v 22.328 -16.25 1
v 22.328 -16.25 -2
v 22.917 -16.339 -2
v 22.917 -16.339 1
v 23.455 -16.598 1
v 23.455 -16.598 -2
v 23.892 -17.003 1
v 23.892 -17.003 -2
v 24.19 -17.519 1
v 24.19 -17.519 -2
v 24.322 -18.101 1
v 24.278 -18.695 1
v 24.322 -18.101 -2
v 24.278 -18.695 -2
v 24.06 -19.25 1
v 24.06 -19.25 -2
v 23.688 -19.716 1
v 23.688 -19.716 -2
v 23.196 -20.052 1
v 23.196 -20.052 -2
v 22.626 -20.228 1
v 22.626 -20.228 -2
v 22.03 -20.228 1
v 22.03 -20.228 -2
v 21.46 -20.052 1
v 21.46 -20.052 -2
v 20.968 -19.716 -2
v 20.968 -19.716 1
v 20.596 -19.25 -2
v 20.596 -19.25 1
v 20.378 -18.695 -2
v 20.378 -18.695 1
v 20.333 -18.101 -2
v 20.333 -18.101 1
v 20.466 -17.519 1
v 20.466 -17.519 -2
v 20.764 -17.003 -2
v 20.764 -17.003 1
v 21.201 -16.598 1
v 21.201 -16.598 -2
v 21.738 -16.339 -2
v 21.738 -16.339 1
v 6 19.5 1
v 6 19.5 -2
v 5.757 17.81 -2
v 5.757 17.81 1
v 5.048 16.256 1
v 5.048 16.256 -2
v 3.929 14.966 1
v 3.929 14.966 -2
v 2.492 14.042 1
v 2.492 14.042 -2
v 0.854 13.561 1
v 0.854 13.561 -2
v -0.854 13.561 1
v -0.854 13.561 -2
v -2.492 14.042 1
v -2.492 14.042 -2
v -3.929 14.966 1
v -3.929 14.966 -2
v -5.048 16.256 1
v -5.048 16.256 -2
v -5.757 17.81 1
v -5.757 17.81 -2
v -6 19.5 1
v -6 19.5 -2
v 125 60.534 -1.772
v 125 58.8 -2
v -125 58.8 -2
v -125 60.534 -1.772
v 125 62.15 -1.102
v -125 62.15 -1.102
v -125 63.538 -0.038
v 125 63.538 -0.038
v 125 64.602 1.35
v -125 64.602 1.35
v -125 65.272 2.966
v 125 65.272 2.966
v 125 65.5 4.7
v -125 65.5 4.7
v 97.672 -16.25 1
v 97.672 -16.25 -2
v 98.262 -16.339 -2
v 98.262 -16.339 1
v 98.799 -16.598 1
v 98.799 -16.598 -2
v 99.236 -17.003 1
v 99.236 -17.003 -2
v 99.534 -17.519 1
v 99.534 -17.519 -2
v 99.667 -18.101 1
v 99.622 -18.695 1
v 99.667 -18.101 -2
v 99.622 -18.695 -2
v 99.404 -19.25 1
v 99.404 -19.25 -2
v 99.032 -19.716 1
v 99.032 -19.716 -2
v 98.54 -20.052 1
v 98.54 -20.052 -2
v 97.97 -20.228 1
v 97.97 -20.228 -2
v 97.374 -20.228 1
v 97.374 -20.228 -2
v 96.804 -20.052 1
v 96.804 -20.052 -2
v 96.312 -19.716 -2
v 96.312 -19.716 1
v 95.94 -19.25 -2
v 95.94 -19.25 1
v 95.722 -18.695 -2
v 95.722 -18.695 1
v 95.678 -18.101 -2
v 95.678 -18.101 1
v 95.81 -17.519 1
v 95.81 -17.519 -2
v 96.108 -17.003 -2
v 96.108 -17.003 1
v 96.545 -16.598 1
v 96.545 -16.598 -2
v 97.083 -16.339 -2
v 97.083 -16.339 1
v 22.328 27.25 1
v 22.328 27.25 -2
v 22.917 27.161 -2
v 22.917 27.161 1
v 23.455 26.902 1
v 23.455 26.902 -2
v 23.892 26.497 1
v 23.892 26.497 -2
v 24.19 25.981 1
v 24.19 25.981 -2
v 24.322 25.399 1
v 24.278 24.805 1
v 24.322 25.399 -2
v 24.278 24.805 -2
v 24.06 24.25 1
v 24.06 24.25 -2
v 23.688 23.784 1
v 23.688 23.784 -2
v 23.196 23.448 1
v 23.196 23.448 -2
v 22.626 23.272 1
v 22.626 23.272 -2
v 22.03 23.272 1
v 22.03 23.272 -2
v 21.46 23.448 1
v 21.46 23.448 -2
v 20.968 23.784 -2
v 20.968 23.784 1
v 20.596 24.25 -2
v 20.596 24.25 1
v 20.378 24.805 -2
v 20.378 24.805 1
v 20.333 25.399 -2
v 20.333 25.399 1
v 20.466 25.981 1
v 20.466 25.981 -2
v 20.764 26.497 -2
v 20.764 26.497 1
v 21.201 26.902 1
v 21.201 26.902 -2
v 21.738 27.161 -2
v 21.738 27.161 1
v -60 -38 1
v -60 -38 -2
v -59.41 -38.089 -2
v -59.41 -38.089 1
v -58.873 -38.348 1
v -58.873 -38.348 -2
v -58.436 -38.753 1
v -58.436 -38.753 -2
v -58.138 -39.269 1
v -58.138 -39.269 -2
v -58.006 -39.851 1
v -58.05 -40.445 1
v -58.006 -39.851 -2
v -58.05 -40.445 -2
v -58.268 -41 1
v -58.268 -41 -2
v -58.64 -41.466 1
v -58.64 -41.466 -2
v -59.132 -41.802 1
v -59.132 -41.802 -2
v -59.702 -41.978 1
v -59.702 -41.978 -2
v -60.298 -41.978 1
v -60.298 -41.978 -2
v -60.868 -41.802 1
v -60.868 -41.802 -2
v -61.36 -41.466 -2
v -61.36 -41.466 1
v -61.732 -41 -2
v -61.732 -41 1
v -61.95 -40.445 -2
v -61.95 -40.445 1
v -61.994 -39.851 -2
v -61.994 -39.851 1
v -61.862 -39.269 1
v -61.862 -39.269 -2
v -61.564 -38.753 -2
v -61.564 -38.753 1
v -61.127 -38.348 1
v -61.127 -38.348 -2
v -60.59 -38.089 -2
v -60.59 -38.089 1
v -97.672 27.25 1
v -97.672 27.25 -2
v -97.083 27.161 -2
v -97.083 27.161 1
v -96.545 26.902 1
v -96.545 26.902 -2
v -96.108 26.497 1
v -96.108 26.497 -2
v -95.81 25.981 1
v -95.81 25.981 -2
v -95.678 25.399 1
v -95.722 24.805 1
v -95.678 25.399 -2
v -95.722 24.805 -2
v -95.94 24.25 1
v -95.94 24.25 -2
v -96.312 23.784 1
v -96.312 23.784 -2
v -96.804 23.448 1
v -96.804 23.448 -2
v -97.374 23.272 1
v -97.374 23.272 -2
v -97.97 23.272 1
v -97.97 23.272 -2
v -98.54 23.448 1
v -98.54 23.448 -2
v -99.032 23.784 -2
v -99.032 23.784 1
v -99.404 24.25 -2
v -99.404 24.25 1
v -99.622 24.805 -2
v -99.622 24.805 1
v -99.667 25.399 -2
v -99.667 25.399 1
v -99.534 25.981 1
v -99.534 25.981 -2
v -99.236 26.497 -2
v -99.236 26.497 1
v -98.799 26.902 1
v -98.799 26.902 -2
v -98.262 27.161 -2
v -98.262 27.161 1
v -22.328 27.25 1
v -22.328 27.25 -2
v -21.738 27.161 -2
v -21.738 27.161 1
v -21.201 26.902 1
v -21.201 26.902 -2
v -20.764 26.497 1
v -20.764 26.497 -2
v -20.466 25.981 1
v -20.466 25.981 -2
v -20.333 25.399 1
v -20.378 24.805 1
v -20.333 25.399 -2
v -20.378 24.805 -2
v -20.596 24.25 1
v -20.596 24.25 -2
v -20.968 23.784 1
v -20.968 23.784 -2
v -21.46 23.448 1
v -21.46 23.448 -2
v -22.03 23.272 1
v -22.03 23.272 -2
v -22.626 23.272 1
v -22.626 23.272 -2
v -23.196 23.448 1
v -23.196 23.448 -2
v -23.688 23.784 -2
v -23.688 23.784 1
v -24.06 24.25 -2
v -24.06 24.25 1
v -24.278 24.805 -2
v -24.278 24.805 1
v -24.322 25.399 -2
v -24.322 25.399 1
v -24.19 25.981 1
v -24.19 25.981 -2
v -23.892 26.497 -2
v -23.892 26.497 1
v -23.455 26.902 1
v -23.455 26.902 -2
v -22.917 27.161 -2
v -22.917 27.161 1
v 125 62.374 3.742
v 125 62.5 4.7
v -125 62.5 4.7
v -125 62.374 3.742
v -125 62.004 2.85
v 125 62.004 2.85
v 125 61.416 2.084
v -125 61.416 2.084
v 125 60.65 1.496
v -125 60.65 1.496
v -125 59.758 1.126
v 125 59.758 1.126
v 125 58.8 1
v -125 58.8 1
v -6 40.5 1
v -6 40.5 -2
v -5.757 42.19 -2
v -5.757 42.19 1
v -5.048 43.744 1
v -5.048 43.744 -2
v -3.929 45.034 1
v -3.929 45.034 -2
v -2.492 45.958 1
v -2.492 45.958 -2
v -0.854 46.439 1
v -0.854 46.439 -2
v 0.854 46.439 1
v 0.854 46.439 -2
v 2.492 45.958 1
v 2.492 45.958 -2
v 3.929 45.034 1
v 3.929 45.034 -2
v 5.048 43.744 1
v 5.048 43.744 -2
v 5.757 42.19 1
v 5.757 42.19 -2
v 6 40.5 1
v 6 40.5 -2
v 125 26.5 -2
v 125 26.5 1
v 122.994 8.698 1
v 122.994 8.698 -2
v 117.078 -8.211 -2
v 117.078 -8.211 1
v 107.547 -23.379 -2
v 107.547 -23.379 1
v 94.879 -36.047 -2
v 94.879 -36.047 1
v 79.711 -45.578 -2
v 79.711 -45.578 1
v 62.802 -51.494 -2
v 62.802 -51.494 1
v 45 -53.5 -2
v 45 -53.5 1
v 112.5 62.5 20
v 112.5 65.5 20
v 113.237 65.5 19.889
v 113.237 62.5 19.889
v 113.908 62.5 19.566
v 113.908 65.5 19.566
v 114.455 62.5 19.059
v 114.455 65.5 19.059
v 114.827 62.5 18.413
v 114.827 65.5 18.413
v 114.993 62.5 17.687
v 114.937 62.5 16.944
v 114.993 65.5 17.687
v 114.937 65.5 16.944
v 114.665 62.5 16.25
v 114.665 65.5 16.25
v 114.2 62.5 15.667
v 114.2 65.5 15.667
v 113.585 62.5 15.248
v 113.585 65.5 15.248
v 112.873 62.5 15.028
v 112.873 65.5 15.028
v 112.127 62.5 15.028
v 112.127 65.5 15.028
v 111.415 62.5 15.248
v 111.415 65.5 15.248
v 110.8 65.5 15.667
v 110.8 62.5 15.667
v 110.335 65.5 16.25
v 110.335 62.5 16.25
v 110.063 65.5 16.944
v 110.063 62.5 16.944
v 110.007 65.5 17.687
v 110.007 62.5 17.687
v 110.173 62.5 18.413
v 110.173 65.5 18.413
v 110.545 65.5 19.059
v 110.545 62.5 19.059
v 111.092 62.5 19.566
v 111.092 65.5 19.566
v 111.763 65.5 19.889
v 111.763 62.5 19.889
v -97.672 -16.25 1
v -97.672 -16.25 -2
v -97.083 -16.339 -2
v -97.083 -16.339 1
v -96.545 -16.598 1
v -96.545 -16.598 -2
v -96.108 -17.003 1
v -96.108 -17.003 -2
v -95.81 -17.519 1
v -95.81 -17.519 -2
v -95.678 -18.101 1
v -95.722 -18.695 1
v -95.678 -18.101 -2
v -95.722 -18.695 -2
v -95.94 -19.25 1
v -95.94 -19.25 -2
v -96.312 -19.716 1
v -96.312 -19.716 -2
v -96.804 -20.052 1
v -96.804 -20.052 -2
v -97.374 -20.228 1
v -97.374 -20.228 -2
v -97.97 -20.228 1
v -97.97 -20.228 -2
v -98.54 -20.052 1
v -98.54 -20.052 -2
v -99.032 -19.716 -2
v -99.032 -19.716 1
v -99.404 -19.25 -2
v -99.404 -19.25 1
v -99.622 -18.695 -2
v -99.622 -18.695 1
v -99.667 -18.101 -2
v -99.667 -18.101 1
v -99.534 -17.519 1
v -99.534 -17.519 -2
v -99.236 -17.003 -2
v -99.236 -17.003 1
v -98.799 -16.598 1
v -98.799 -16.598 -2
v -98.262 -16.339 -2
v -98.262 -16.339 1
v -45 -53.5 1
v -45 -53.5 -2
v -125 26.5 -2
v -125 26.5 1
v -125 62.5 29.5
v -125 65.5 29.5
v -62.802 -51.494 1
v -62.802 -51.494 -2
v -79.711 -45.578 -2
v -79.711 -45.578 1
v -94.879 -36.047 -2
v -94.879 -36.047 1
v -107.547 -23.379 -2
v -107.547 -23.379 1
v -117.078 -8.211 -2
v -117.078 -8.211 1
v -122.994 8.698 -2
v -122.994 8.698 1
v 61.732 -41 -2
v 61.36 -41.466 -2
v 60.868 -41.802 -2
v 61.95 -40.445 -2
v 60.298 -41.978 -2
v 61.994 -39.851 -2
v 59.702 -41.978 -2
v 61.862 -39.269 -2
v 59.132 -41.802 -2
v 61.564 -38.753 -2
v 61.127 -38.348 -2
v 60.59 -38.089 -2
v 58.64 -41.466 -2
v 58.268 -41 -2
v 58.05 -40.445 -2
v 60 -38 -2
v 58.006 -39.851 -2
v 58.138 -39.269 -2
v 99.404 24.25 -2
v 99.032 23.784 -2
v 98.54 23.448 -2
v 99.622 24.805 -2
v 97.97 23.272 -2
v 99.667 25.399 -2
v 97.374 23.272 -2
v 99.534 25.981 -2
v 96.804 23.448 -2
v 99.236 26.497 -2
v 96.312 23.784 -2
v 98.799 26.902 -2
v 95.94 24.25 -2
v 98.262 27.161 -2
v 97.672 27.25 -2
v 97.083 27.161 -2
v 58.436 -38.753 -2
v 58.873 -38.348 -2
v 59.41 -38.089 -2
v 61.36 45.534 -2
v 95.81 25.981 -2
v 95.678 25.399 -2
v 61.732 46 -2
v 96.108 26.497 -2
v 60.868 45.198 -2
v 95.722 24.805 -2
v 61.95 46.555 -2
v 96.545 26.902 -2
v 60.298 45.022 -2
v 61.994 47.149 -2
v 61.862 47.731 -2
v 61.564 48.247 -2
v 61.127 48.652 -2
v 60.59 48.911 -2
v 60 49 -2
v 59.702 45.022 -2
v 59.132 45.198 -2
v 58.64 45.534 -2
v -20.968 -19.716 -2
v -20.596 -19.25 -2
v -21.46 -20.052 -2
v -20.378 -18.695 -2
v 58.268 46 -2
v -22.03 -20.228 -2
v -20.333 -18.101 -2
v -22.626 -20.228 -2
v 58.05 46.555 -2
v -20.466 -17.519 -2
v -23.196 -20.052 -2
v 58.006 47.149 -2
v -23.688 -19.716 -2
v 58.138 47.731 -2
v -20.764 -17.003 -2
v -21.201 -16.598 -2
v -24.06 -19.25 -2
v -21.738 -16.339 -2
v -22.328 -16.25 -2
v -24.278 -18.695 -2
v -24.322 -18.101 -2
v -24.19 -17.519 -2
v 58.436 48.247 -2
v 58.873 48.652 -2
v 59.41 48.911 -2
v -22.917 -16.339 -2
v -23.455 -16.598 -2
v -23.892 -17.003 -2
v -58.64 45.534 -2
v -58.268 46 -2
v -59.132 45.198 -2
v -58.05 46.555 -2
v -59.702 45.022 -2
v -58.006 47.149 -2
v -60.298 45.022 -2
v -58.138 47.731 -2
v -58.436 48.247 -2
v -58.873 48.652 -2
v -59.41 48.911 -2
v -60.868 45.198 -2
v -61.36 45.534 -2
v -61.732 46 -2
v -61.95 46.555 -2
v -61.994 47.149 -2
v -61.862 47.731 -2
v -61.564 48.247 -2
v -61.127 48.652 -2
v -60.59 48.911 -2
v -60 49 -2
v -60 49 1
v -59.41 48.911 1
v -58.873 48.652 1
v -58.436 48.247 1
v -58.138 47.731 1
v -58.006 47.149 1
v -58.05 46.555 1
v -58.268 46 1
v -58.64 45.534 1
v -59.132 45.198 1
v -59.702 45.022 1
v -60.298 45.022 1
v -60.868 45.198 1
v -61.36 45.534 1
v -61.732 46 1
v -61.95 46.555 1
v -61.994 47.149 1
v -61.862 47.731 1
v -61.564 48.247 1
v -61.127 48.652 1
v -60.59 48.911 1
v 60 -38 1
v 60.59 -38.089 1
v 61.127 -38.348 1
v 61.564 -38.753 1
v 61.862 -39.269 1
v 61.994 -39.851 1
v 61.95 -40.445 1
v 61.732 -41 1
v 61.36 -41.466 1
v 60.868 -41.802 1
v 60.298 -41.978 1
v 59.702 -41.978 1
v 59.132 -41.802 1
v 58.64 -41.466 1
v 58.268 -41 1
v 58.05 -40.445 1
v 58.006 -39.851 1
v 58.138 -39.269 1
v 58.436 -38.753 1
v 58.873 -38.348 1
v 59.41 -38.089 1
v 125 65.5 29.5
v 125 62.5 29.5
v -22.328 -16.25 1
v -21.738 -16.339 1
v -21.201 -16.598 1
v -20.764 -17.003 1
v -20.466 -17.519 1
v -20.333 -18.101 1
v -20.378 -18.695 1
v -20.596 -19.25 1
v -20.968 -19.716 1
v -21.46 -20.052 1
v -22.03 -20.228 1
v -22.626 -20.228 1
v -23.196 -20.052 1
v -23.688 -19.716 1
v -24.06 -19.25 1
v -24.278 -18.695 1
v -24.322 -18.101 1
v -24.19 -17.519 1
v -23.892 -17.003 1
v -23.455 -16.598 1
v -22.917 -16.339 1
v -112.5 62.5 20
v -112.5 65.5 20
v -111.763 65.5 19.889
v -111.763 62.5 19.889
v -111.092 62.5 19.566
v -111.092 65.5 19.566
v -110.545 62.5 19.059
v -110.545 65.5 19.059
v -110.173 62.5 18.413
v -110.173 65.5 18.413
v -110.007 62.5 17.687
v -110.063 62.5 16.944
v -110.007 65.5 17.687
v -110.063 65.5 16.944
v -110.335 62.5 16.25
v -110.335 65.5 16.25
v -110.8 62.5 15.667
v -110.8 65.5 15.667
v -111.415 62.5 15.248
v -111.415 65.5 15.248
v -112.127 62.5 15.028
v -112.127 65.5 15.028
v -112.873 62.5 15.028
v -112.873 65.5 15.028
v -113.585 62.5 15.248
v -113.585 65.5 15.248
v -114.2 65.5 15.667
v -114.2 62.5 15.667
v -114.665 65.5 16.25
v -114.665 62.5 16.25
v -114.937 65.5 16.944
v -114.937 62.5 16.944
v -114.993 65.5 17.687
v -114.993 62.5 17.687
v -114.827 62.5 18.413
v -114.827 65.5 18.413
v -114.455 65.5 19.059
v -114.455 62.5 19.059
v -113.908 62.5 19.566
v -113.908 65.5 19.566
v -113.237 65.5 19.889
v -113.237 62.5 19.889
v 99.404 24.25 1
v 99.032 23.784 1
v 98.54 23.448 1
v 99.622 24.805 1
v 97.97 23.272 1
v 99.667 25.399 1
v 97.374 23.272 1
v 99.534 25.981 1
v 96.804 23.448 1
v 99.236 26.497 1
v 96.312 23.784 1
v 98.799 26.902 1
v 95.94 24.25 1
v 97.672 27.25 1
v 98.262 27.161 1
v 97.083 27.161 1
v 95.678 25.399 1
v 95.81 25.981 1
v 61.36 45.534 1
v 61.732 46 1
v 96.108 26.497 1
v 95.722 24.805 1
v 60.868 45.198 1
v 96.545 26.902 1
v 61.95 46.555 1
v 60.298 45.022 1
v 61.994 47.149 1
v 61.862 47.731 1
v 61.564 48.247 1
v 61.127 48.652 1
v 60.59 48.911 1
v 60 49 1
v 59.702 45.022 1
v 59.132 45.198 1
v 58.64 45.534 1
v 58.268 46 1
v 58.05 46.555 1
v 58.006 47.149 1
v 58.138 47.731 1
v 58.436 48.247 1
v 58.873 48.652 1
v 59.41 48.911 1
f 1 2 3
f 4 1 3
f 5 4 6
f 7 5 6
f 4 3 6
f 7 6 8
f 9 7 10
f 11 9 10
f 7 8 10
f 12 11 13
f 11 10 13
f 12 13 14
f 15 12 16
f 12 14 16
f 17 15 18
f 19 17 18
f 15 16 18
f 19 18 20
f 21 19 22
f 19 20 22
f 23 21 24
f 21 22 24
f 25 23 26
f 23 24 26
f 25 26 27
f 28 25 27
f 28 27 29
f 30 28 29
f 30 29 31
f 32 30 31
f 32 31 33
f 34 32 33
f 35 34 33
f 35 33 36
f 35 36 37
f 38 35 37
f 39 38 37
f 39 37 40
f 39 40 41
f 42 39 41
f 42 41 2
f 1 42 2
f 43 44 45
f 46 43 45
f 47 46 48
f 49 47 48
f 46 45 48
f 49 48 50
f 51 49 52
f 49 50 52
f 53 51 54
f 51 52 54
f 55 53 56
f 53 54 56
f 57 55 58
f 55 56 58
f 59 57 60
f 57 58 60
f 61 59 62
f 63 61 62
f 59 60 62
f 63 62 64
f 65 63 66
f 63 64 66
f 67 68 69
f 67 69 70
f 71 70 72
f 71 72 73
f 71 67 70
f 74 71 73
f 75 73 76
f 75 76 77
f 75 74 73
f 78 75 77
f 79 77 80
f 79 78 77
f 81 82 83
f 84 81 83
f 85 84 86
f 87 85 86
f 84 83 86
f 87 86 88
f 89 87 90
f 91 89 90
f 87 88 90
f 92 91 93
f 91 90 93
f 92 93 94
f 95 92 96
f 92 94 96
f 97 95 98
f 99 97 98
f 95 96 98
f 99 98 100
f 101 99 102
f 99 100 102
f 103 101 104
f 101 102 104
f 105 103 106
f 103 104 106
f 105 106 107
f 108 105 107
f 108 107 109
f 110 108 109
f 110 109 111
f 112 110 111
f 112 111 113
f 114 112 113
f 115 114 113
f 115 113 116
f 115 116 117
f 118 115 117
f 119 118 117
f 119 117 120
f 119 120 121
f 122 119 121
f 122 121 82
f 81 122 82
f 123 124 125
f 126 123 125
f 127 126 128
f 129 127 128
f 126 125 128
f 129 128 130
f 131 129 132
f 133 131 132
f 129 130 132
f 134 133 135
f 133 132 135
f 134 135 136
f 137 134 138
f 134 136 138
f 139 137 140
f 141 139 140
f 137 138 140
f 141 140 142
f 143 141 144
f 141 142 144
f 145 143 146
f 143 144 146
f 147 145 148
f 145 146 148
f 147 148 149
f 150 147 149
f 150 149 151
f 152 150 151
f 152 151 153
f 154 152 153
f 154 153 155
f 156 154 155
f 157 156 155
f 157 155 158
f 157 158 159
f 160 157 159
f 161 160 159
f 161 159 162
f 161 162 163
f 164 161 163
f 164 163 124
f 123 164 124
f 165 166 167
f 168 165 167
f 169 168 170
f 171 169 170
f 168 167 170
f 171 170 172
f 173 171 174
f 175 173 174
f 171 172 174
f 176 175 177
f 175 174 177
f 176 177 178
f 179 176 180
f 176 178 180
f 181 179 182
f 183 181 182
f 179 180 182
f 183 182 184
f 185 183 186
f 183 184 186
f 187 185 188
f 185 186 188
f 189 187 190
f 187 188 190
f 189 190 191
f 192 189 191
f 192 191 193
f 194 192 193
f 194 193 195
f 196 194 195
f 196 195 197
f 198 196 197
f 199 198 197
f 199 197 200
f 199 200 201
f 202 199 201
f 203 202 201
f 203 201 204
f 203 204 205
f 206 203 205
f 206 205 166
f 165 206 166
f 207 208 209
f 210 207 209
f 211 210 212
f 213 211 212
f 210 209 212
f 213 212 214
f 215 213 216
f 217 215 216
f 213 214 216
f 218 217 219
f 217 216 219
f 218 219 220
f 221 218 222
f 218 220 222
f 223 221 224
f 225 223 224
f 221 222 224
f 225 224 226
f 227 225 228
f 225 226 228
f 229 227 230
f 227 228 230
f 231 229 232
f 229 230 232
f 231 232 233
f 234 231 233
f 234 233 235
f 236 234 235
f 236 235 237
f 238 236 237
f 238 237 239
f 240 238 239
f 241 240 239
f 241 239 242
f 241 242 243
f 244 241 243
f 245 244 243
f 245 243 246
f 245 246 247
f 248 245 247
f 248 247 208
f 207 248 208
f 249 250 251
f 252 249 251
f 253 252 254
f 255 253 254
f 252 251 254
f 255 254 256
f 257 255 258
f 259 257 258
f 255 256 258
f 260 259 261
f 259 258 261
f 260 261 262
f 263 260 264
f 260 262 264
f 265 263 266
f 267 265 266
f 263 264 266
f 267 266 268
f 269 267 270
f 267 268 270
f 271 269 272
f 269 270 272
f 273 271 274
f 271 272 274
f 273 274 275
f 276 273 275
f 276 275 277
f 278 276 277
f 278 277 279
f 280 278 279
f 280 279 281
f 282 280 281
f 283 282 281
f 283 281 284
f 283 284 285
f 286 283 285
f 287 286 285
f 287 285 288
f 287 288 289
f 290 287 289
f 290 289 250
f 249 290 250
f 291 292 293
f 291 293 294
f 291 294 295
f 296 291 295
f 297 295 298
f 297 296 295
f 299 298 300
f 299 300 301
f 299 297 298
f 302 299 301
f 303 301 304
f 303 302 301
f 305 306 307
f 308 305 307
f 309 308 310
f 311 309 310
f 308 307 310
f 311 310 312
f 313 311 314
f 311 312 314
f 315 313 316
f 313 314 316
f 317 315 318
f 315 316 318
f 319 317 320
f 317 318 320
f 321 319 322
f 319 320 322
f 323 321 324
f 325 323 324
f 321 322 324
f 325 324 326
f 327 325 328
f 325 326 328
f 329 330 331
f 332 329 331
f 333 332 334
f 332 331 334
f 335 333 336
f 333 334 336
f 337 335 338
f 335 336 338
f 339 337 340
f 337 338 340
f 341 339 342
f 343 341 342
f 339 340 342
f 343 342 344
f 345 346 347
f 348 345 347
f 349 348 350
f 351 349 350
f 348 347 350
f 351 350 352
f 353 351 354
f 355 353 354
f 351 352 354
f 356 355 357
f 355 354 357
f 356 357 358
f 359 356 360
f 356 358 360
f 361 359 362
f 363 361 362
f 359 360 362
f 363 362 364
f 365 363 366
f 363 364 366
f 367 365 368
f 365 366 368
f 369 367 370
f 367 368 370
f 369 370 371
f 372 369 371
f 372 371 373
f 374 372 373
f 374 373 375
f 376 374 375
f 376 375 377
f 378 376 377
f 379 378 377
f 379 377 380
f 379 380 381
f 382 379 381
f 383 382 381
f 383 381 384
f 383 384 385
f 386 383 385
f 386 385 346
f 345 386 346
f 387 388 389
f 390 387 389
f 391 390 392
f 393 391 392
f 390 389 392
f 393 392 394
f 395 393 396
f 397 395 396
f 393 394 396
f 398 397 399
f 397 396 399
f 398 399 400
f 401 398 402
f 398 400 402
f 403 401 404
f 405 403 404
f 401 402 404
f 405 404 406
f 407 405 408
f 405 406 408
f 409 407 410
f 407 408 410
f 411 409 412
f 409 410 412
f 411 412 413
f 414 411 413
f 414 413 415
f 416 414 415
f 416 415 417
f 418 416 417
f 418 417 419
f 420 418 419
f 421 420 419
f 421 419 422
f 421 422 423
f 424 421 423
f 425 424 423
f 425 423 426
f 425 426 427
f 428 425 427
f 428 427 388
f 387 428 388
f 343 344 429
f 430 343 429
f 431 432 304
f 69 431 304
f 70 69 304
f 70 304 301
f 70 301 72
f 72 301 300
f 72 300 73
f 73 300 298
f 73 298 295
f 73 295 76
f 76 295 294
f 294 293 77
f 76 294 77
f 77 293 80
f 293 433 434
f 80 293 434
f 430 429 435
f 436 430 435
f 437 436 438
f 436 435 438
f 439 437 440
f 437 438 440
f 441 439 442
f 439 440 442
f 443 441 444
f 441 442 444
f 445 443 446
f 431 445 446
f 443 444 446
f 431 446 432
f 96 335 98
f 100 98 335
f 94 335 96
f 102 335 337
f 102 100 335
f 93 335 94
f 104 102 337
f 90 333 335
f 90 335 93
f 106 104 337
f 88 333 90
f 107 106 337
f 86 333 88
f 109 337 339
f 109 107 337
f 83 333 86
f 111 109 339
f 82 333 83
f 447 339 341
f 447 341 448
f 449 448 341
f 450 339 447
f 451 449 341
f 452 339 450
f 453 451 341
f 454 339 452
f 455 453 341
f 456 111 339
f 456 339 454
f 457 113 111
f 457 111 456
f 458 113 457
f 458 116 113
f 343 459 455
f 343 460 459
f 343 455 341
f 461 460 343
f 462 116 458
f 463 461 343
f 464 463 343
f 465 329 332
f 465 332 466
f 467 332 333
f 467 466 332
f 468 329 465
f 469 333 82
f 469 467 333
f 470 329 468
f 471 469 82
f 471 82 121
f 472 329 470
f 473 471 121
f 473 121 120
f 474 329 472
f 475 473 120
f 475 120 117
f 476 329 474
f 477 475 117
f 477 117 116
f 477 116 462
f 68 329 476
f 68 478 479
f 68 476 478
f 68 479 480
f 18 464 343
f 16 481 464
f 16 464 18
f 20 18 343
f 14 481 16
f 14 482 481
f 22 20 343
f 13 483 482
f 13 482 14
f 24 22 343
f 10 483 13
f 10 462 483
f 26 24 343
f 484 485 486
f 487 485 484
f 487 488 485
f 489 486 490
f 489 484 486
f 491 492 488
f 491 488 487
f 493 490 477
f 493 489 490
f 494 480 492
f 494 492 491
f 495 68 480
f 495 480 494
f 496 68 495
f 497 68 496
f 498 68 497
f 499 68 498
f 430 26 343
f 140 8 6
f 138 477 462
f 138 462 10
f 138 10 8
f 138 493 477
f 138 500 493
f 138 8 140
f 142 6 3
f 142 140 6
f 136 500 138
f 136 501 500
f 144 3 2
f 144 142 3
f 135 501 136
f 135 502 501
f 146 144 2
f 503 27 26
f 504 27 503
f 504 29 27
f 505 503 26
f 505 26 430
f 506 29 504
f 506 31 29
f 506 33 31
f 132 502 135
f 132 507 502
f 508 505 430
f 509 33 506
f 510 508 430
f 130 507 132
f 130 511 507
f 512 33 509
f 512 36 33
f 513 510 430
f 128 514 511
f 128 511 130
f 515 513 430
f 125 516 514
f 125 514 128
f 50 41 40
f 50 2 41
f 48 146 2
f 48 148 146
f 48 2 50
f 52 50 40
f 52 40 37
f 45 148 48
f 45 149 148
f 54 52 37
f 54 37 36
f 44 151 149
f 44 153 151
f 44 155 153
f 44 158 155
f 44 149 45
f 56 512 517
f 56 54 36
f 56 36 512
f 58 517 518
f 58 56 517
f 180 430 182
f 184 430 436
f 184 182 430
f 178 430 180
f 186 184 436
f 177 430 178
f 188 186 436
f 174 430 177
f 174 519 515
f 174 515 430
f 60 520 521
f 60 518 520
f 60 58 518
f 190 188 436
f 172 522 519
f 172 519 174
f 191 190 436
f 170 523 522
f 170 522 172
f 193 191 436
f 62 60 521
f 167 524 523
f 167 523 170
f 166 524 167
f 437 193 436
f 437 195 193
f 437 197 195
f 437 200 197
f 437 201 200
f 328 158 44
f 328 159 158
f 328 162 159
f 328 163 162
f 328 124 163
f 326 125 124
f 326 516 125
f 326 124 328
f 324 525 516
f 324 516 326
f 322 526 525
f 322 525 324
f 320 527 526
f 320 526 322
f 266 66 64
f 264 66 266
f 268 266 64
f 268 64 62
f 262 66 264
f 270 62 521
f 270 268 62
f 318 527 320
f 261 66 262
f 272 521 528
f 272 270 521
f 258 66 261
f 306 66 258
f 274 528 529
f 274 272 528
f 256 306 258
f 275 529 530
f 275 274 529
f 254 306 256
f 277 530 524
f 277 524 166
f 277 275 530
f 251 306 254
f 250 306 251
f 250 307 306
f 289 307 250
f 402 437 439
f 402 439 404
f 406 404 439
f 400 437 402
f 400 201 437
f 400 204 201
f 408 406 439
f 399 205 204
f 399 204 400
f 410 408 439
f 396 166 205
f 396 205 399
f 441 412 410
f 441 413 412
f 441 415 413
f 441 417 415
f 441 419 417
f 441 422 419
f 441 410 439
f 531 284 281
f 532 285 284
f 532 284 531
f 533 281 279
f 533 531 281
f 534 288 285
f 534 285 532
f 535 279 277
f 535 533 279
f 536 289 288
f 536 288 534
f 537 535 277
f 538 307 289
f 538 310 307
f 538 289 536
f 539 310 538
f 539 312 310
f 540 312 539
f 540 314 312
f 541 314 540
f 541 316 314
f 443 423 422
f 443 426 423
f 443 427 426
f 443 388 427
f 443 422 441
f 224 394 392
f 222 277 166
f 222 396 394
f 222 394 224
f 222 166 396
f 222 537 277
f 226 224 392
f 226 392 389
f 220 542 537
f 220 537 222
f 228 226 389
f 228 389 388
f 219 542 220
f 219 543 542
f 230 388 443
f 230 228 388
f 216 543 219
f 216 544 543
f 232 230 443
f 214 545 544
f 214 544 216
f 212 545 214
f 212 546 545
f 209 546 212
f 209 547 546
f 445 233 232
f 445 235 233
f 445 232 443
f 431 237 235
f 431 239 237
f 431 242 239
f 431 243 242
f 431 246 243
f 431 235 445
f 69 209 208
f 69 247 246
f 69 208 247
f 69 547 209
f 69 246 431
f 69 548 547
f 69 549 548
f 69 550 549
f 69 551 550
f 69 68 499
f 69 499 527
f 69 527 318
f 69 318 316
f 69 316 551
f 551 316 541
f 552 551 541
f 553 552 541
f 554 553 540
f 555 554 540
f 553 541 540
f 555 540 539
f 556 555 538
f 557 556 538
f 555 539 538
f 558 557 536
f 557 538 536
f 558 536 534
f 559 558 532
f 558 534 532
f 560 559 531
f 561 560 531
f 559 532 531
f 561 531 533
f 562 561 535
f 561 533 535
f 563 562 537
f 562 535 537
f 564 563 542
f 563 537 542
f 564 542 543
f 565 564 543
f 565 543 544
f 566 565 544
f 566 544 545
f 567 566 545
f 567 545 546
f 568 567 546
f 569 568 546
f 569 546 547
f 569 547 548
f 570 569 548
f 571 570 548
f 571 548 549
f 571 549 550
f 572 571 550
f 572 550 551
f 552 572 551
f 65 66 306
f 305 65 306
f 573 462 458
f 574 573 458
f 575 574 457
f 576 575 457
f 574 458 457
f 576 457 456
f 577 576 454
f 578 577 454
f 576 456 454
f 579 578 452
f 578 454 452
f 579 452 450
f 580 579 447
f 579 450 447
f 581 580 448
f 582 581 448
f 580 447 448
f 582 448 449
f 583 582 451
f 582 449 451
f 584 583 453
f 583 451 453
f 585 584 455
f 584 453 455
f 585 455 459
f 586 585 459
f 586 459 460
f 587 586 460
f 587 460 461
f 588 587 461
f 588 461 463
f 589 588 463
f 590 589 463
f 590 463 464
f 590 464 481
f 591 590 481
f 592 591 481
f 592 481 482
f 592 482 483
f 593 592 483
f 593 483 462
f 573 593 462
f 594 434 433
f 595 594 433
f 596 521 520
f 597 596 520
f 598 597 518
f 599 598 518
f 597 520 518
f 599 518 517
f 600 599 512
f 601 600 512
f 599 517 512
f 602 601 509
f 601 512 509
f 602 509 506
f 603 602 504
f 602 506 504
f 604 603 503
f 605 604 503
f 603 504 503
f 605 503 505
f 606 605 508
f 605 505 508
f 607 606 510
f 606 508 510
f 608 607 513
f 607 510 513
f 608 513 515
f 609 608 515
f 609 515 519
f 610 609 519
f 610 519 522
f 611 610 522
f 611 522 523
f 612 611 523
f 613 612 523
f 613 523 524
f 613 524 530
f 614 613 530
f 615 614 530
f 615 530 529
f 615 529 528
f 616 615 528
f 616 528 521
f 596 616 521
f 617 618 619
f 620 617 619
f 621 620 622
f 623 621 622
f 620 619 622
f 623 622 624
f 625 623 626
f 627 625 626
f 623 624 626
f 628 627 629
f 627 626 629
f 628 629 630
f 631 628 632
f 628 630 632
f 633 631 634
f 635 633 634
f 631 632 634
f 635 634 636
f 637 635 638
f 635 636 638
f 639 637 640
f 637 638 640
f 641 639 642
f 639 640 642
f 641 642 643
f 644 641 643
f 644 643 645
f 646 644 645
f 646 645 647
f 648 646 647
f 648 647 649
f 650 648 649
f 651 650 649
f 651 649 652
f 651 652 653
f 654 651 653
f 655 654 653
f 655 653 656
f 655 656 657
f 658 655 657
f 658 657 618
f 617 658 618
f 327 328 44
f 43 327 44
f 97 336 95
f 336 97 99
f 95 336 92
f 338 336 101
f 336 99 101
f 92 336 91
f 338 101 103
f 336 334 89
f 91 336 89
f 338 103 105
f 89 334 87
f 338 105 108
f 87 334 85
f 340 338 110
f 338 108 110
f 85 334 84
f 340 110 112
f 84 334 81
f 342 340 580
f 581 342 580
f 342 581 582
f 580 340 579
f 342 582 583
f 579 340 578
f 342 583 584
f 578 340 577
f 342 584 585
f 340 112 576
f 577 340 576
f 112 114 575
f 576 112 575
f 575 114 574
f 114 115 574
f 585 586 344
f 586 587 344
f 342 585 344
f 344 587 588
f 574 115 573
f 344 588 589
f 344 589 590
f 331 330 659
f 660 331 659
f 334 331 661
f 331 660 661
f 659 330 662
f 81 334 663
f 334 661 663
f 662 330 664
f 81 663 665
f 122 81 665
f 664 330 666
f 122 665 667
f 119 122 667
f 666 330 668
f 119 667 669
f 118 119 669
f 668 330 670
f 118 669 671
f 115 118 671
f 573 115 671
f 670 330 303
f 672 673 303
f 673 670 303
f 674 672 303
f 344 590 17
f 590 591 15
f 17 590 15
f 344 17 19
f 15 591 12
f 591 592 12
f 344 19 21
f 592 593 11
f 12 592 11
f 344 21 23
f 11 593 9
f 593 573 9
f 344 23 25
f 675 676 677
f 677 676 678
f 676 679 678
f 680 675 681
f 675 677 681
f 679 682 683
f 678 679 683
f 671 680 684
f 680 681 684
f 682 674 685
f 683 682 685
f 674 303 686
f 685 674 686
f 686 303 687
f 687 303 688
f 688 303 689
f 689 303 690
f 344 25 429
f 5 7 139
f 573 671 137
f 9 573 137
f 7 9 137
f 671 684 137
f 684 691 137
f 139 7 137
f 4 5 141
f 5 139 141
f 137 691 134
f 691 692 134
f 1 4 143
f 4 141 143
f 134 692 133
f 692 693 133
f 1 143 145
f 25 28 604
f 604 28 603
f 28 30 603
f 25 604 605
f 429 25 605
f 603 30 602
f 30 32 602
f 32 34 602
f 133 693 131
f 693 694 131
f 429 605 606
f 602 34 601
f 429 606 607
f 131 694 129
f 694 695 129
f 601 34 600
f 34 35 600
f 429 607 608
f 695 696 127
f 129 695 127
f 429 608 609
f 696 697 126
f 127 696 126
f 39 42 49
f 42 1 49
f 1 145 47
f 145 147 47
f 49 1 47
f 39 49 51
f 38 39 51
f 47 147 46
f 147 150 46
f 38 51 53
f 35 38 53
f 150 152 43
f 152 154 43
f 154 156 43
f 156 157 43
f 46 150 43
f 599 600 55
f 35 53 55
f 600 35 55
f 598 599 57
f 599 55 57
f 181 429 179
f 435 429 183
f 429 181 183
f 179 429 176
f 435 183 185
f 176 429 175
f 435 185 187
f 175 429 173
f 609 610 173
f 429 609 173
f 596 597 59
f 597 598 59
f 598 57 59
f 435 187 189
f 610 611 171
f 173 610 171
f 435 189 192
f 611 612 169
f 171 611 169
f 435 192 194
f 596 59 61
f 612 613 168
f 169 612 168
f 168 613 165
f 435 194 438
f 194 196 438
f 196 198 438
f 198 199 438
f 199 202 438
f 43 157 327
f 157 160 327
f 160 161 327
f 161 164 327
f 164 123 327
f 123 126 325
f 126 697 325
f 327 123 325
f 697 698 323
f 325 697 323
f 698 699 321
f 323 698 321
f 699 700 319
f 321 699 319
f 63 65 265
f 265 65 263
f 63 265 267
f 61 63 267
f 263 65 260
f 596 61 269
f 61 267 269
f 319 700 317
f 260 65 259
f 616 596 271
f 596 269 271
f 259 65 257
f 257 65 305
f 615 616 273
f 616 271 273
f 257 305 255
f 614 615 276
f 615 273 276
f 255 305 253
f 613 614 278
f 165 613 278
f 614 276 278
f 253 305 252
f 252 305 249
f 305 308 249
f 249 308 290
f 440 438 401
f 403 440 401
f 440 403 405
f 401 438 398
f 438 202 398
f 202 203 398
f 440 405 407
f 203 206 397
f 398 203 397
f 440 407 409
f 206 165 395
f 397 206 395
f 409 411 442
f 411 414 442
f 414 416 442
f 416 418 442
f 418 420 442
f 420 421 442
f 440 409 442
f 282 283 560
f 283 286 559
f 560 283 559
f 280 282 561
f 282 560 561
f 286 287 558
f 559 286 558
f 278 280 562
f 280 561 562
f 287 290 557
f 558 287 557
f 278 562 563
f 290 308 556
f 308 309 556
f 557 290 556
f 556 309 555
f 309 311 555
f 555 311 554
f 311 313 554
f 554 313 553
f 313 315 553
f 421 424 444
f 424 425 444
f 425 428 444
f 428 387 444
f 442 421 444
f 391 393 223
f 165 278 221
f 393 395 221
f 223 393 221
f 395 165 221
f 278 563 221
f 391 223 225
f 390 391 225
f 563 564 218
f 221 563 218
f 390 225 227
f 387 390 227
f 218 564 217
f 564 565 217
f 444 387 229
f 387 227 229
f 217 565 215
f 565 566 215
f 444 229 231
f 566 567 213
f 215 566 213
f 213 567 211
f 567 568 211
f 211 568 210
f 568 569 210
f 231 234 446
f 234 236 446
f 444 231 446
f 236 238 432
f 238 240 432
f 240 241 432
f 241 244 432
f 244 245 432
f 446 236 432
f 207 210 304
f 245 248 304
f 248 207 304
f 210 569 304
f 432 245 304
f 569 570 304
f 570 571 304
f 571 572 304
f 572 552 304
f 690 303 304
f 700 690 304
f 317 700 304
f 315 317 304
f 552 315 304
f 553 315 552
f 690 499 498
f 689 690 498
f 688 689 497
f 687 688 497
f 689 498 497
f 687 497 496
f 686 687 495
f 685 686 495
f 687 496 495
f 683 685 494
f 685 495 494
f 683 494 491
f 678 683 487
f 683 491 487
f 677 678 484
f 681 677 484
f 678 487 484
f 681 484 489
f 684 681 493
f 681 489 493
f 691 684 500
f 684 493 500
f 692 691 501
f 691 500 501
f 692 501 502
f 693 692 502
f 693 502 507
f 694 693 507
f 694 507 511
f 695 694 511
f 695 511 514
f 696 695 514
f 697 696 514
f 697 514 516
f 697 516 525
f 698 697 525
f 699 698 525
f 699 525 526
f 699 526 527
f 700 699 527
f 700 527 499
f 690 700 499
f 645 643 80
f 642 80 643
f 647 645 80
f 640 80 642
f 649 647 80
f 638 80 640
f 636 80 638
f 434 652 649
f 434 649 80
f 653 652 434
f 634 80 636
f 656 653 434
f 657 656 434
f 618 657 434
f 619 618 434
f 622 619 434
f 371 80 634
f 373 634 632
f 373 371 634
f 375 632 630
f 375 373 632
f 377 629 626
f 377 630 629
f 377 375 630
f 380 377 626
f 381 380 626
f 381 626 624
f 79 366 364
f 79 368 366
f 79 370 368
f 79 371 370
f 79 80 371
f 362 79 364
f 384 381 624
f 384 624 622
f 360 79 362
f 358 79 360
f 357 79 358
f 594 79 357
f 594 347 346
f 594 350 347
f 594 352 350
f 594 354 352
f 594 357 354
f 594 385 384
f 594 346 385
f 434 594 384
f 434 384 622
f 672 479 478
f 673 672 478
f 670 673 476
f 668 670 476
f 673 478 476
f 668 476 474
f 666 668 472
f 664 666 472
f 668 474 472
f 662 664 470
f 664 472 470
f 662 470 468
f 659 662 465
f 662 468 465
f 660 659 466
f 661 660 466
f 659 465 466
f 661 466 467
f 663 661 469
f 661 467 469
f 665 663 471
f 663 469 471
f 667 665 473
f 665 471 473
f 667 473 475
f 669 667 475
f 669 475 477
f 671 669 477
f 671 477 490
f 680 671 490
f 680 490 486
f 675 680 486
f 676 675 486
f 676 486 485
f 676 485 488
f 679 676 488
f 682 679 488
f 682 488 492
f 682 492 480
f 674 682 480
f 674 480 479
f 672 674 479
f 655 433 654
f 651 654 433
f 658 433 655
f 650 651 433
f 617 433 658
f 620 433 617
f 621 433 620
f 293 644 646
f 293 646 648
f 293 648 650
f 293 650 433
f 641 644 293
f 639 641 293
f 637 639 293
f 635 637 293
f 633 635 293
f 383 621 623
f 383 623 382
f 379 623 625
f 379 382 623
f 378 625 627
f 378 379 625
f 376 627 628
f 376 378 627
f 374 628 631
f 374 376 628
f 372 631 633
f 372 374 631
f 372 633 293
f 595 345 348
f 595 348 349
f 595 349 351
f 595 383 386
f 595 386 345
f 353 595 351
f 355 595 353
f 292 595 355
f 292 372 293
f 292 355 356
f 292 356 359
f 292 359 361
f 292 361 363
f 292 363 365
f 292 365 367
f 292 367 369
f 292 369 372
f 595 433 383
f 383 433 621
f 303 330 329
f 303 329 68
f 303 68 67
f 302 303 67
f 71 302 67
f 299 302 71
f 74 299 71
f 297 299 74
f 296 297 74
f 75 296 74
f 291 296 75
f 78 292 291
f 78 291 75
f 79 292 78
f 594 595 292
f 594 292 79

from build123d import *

# Parameters (mm, degrees)
BOSS_EXTRUDE1_DEPTH          = 125
SKETCH2_R                    = 2
CUT_EXTRUDE1_DEPTH           = 144.165114466
FILLET1_R                    = 80
SKETCH3_R                    = 2.5
CUT_EXTRUDE2_DEPTH           = 10
CUT_EXTRUDE3_DEPTH           = 10
BASE_FLANGE1_START           = -3
BASE_FLANGE1_DEPTH           = 3
EDGE_FLANGE1_STRIP_W         = 19.4
EDGE_FLANGE1_STRIP_H         = 3
EDGE_FLANGE1_STRIP_CUT_DEPTH = 250
EDGE_FLANGE1_DEPTH           = 250
SKETCH13_R                   = 2
CUT_EXTRUDE4_DEPTH           = 10
SKETCH14_R                   = 2.5
CUT_EXTRUDE5_DEPTH           = 10


# Read off the part's stored shape, not the designer's step: Base-Flange1
# Sheet-metal steps are written as plain solids
with BuildPart() as part:
    # Sketch1 → Boss-Extrude1 (new, symmetric)
    with BuildSketch(Plane(origin=(0, 0, 0), x_dir=(0, 0, -1), z_dir=(1, 0, 0))):
        with BuildLine():
            Line((-31, 61.5), (-6, 61.5))
            ThreePointArc((-6, 61.5), (-0.343145751, 59.156854249), (2, 53.5))
            Line((2, 53.5), (2, -53.5))
            Line((2, -53.5), (-2, -53.5))
            Line((-2, -53.5), (-2, 53.5))
            ThreePointArc((-2, 53.5), (-3.171572875, 56.328427125), (-6, 57.5))
            Line((-6, 57.5), (-31, 57.5))
            Line((-31, 57.5), (-31, 61.5))
        make_face()
    extrude(amount=BOSS_EXTRUDE1_DEPTH, both=True)

    # Sketch2 → Cut-Extrude1 (cut, through all)
    with BuildSketch(Plane(origin=(0, 0, -2), x_dir=(-1, 0, 0), z_dir=(0, 0, -1))):
        with Locations(Location((60, 47, 0), (0, 0, 90))):
            Circle(SKETCH2_R)
        with Locations(Location((97.672105065, 25.25, 0), (0, 0, 90))):
            Circle(SKETCH2_R)
        with Locations(Location((97.672105065, -18.25, 0), (0, 0, 90))):
            Circle(SKETCH2_R)
        with Locations(Location((60, -40, 0), (0, 0, 90))):
            Circle(SKETCH2_R)
        with Locations(Location((22.327894935, -18.25, 0), (0, 0, 90))):
            Circle(SKETCH2_R)
        with Locations(Location((22.327894935, 25.25, 0), (0, 0, 90))):
            Circle(SKETCH2_R)
        with Locations(Location((-22.327894935, 25.25, 0), (0, 0, 90))):
            Circle(SKETCH2_R)
        with Locations(Location((-22.327894935, -18.25, 0), (0, 0, 90))):
            Circle(SKETCH2_R)
        with Locations(Location((-60, -40, 0), (0, 0, 90))):
            Circle(SKETCH2_R)
        with Locations(Location((-97.672105065, -18.25, 0), (0, 0, 90))):
            Circle(SKETCH2_R)
        with Locations(Location((-97.672105065, 25.25, 0), (0, 0, 90))):
            Circle(SKETCH2_R)
        with Locations(Location((-60, 47, 0), (0, 0, 90))):
            Circle(SKETCH2_R)
    extrude(amount=-CUT_EXTRUDE1_DEPTH, mode=Mode.SUBTRACT)

    # Fillet1
    fillet1_edges = [part.edges().sort_by_distance(p)[0] for p in [
        (125, -53.5, 0),
        (-125, -53.5, 0),
    ]]
    fillet(fillet1_edges, radius=FILLET1_R)

    # Sketch3 → Cut-Extrude2 (cut)
    with BuildSketch(Plane(origin=(0, 61.5, 0), x_dir=(1, 0, 0), z_dir=(0, 1, 0))):
        with Locations(Location((-112.5, -18.5, 0), (0, 0, 270))):
            Circle(SKETCH3_R)
        with Locations(Location((112.5, -18.5, 0), (0, 0, 270))):
            Circle(SKETCH3_R)
    extrude(amount=-CUT_EXTRUDE2_DEPTH, mode=Mode.SUBTRACT)

    # Sketch4 → Cut-Extrude3 (cut)
    with BuildSketch(Plane(origin=(0, 0, -2), x_dir=(-1, 0, 0), z_dir=(0, 0, -1))):
        with BuildLine():
            Line((6, 40.5), (6, 19.5))
            ThreePointArc((6, 19.5), (0, 13.5), (-6, 19.5))
            Line((-6, 19.5), (-6, 40.5))
            ThreePointArc((-6, 40.5), (0, 46.5), (6, 40.5))
        make_face()
    extrude(amount=-CUT_EXTRUDE3_DEPTH, mode=Mode.SUBTRACT)


with BuildPart() as body_2:
    # Base-Flange1 outline → Base-Flange1 (new body)
    with BuildSketch(Plane(origin=(0, 0, -2), x_dir=(-1, 0, 0), z_dir=(0, 0, -1)).offset(BASE_FLANGE1_START)):
        with BuildLine():
            Line((125, 65.5), (-125, 65.5))
            Line((-125, 65.5), (-125, 26.5))
            ThreePointArc((-125, 26.5), (-101.568542495, -30.068542495), (-45, -53.5))
            Line((-45, -53.5), (45, -53.5))
            ThreePointArc((45, -53.5), (101.568542495, -30.068542495), (125, 26.5))
            Line((125, 26.5), (125, 65.5))
        make_face()
    extrude(amount=BASE_FLANGE1_DEPTH)

    # Edge-Flange1 strip (across the edge) → Edge-Flange1 strip cut (cut)
    with BuildSketch(Plane(origin=(125, 65.5, 1), x_dir=(0, -1, 0), z_dir=(-1, 0, 0))):
        with Locations((-3, -1.5)):
            Rectangle(EDGE_FLANGE1_STRIP_W, EDGE_FLANGE1_STRIP_H)
    extrude(amount=EDGE_FLANGE1_STRIP_CUT_DEPTH, mode=Mode.SUBTRACT)

    # Edge-Flange1 section (across the edge) → Edge-Flange1 (add)
    with BuildSketch(Plane(origin=(125, 65.5, 1), x_dir=(0, -1, 0), z_dir=(-1, 0, 0))):
        with BuildLine():
            Line((0, 3.7), (0, 28.5))
            Line((0, 28.5), (3, 28.5))
            Line((3, 28.5), (3, 3.7))
            ThreePointArc((3, 3.7), (4.08370491, 1.08370491), (6.7, 0))
            Line((6.7, 0), (6.7, -3))
            ThreePointArc((6.7, -3), (1.962384566, -1.037615434), (0, 3.7))
        make_face()
    extrude(amount=EDGE_FLANGE1_DEPTH)

    # Sketch13 → Cut-Extrude4 (cut)
    with BuildSketch(Plane(origin=(0, 0, -2), x_dir=(-1, 0, 0), z_dir=(0, 0, -1))):
        with Locations(Location((97.672105065, -18.25, 0), (0, 0, 90))):
            Circle(SKETCH13_R)
        with Locations(Location((97.672105065, 25.25, 0), (0, 0, 90))):
            Circle(SKETCH13_R)
        with Locations(Location((60, 47, 0), (0, 0, 90))):
            Circle(SKETCH13_R)
        with Locations(Location((-97.672105065, -18.25, 0), (0, 0, 90))):
            Circle(SKETCH13_R)
        with Locations(Location((-60, -40, 0), (0, 0, 90))):
            Circle(SKETCH13_R)
        with Locations(Location((-22.327894935, -18.25, 0), (0, 0, 90))):
            Circle(SKETCH13_R)
        with Locations(Location((-22.327894935, 25.25, 0), (0, 0, 90))):
            Circle(SKETCH13_R)
        with Locations(Location((22.327894935, 25.25, 0), (0, 0, 90))):
            Circle(SKETCH13_R)
        with Locations(Location((22.327894935, -18.25, 0), (0, 0, 90))):
            Circle(SKETCH13_R)
        with Locations(Location((60, -40, 0), (0, 0, 90))):
            Circle(SKETCH13_R)
        with Locations(Location((-60, 47, 0), (0, 0, 90))):
            Circle(SKETCH13_R)
        with Locations(Location((-97.672105065, 25.25, 0), (0, 0, 90))):
            Circle(SKETCH13_R)
        with BuildLine():
            Line((6, 19.5), (6, 40.5))
            ThreePointArc((6, 40.5), (0, 46.5), (-6, 40.5))
            Line((-6, 40.5), (-6, 19.5))
            ThreePointArc((-6, 19.5), (0, 13.5), (6, 19.5))
        make_face()
    extrude(amount=-CUT_EXTRUDE4_DEPTH, mode=Mode.SUBTRACT)

    # Sketch14 → Cut-Extrude5 (cut)
    with BuildSketch(Plane(origin=(0, 65.5, 0), x_dir=(1, 0, 0), z_dir=(0, 1, 0))):
        with Locations(Location((-112.5, -17.5, 0), (0, 0, 270))):
            Circle(SKETCH14_R)
        with Locations(Location((112.5, -17.5, 0), (0, 0, 270))):
            Circle(SKETCH14_R)
    extrude(amount=-CUT_EXTRUDE5_DEPTH, mode=Mode.SUBTRACT)


solid = body_2.part
